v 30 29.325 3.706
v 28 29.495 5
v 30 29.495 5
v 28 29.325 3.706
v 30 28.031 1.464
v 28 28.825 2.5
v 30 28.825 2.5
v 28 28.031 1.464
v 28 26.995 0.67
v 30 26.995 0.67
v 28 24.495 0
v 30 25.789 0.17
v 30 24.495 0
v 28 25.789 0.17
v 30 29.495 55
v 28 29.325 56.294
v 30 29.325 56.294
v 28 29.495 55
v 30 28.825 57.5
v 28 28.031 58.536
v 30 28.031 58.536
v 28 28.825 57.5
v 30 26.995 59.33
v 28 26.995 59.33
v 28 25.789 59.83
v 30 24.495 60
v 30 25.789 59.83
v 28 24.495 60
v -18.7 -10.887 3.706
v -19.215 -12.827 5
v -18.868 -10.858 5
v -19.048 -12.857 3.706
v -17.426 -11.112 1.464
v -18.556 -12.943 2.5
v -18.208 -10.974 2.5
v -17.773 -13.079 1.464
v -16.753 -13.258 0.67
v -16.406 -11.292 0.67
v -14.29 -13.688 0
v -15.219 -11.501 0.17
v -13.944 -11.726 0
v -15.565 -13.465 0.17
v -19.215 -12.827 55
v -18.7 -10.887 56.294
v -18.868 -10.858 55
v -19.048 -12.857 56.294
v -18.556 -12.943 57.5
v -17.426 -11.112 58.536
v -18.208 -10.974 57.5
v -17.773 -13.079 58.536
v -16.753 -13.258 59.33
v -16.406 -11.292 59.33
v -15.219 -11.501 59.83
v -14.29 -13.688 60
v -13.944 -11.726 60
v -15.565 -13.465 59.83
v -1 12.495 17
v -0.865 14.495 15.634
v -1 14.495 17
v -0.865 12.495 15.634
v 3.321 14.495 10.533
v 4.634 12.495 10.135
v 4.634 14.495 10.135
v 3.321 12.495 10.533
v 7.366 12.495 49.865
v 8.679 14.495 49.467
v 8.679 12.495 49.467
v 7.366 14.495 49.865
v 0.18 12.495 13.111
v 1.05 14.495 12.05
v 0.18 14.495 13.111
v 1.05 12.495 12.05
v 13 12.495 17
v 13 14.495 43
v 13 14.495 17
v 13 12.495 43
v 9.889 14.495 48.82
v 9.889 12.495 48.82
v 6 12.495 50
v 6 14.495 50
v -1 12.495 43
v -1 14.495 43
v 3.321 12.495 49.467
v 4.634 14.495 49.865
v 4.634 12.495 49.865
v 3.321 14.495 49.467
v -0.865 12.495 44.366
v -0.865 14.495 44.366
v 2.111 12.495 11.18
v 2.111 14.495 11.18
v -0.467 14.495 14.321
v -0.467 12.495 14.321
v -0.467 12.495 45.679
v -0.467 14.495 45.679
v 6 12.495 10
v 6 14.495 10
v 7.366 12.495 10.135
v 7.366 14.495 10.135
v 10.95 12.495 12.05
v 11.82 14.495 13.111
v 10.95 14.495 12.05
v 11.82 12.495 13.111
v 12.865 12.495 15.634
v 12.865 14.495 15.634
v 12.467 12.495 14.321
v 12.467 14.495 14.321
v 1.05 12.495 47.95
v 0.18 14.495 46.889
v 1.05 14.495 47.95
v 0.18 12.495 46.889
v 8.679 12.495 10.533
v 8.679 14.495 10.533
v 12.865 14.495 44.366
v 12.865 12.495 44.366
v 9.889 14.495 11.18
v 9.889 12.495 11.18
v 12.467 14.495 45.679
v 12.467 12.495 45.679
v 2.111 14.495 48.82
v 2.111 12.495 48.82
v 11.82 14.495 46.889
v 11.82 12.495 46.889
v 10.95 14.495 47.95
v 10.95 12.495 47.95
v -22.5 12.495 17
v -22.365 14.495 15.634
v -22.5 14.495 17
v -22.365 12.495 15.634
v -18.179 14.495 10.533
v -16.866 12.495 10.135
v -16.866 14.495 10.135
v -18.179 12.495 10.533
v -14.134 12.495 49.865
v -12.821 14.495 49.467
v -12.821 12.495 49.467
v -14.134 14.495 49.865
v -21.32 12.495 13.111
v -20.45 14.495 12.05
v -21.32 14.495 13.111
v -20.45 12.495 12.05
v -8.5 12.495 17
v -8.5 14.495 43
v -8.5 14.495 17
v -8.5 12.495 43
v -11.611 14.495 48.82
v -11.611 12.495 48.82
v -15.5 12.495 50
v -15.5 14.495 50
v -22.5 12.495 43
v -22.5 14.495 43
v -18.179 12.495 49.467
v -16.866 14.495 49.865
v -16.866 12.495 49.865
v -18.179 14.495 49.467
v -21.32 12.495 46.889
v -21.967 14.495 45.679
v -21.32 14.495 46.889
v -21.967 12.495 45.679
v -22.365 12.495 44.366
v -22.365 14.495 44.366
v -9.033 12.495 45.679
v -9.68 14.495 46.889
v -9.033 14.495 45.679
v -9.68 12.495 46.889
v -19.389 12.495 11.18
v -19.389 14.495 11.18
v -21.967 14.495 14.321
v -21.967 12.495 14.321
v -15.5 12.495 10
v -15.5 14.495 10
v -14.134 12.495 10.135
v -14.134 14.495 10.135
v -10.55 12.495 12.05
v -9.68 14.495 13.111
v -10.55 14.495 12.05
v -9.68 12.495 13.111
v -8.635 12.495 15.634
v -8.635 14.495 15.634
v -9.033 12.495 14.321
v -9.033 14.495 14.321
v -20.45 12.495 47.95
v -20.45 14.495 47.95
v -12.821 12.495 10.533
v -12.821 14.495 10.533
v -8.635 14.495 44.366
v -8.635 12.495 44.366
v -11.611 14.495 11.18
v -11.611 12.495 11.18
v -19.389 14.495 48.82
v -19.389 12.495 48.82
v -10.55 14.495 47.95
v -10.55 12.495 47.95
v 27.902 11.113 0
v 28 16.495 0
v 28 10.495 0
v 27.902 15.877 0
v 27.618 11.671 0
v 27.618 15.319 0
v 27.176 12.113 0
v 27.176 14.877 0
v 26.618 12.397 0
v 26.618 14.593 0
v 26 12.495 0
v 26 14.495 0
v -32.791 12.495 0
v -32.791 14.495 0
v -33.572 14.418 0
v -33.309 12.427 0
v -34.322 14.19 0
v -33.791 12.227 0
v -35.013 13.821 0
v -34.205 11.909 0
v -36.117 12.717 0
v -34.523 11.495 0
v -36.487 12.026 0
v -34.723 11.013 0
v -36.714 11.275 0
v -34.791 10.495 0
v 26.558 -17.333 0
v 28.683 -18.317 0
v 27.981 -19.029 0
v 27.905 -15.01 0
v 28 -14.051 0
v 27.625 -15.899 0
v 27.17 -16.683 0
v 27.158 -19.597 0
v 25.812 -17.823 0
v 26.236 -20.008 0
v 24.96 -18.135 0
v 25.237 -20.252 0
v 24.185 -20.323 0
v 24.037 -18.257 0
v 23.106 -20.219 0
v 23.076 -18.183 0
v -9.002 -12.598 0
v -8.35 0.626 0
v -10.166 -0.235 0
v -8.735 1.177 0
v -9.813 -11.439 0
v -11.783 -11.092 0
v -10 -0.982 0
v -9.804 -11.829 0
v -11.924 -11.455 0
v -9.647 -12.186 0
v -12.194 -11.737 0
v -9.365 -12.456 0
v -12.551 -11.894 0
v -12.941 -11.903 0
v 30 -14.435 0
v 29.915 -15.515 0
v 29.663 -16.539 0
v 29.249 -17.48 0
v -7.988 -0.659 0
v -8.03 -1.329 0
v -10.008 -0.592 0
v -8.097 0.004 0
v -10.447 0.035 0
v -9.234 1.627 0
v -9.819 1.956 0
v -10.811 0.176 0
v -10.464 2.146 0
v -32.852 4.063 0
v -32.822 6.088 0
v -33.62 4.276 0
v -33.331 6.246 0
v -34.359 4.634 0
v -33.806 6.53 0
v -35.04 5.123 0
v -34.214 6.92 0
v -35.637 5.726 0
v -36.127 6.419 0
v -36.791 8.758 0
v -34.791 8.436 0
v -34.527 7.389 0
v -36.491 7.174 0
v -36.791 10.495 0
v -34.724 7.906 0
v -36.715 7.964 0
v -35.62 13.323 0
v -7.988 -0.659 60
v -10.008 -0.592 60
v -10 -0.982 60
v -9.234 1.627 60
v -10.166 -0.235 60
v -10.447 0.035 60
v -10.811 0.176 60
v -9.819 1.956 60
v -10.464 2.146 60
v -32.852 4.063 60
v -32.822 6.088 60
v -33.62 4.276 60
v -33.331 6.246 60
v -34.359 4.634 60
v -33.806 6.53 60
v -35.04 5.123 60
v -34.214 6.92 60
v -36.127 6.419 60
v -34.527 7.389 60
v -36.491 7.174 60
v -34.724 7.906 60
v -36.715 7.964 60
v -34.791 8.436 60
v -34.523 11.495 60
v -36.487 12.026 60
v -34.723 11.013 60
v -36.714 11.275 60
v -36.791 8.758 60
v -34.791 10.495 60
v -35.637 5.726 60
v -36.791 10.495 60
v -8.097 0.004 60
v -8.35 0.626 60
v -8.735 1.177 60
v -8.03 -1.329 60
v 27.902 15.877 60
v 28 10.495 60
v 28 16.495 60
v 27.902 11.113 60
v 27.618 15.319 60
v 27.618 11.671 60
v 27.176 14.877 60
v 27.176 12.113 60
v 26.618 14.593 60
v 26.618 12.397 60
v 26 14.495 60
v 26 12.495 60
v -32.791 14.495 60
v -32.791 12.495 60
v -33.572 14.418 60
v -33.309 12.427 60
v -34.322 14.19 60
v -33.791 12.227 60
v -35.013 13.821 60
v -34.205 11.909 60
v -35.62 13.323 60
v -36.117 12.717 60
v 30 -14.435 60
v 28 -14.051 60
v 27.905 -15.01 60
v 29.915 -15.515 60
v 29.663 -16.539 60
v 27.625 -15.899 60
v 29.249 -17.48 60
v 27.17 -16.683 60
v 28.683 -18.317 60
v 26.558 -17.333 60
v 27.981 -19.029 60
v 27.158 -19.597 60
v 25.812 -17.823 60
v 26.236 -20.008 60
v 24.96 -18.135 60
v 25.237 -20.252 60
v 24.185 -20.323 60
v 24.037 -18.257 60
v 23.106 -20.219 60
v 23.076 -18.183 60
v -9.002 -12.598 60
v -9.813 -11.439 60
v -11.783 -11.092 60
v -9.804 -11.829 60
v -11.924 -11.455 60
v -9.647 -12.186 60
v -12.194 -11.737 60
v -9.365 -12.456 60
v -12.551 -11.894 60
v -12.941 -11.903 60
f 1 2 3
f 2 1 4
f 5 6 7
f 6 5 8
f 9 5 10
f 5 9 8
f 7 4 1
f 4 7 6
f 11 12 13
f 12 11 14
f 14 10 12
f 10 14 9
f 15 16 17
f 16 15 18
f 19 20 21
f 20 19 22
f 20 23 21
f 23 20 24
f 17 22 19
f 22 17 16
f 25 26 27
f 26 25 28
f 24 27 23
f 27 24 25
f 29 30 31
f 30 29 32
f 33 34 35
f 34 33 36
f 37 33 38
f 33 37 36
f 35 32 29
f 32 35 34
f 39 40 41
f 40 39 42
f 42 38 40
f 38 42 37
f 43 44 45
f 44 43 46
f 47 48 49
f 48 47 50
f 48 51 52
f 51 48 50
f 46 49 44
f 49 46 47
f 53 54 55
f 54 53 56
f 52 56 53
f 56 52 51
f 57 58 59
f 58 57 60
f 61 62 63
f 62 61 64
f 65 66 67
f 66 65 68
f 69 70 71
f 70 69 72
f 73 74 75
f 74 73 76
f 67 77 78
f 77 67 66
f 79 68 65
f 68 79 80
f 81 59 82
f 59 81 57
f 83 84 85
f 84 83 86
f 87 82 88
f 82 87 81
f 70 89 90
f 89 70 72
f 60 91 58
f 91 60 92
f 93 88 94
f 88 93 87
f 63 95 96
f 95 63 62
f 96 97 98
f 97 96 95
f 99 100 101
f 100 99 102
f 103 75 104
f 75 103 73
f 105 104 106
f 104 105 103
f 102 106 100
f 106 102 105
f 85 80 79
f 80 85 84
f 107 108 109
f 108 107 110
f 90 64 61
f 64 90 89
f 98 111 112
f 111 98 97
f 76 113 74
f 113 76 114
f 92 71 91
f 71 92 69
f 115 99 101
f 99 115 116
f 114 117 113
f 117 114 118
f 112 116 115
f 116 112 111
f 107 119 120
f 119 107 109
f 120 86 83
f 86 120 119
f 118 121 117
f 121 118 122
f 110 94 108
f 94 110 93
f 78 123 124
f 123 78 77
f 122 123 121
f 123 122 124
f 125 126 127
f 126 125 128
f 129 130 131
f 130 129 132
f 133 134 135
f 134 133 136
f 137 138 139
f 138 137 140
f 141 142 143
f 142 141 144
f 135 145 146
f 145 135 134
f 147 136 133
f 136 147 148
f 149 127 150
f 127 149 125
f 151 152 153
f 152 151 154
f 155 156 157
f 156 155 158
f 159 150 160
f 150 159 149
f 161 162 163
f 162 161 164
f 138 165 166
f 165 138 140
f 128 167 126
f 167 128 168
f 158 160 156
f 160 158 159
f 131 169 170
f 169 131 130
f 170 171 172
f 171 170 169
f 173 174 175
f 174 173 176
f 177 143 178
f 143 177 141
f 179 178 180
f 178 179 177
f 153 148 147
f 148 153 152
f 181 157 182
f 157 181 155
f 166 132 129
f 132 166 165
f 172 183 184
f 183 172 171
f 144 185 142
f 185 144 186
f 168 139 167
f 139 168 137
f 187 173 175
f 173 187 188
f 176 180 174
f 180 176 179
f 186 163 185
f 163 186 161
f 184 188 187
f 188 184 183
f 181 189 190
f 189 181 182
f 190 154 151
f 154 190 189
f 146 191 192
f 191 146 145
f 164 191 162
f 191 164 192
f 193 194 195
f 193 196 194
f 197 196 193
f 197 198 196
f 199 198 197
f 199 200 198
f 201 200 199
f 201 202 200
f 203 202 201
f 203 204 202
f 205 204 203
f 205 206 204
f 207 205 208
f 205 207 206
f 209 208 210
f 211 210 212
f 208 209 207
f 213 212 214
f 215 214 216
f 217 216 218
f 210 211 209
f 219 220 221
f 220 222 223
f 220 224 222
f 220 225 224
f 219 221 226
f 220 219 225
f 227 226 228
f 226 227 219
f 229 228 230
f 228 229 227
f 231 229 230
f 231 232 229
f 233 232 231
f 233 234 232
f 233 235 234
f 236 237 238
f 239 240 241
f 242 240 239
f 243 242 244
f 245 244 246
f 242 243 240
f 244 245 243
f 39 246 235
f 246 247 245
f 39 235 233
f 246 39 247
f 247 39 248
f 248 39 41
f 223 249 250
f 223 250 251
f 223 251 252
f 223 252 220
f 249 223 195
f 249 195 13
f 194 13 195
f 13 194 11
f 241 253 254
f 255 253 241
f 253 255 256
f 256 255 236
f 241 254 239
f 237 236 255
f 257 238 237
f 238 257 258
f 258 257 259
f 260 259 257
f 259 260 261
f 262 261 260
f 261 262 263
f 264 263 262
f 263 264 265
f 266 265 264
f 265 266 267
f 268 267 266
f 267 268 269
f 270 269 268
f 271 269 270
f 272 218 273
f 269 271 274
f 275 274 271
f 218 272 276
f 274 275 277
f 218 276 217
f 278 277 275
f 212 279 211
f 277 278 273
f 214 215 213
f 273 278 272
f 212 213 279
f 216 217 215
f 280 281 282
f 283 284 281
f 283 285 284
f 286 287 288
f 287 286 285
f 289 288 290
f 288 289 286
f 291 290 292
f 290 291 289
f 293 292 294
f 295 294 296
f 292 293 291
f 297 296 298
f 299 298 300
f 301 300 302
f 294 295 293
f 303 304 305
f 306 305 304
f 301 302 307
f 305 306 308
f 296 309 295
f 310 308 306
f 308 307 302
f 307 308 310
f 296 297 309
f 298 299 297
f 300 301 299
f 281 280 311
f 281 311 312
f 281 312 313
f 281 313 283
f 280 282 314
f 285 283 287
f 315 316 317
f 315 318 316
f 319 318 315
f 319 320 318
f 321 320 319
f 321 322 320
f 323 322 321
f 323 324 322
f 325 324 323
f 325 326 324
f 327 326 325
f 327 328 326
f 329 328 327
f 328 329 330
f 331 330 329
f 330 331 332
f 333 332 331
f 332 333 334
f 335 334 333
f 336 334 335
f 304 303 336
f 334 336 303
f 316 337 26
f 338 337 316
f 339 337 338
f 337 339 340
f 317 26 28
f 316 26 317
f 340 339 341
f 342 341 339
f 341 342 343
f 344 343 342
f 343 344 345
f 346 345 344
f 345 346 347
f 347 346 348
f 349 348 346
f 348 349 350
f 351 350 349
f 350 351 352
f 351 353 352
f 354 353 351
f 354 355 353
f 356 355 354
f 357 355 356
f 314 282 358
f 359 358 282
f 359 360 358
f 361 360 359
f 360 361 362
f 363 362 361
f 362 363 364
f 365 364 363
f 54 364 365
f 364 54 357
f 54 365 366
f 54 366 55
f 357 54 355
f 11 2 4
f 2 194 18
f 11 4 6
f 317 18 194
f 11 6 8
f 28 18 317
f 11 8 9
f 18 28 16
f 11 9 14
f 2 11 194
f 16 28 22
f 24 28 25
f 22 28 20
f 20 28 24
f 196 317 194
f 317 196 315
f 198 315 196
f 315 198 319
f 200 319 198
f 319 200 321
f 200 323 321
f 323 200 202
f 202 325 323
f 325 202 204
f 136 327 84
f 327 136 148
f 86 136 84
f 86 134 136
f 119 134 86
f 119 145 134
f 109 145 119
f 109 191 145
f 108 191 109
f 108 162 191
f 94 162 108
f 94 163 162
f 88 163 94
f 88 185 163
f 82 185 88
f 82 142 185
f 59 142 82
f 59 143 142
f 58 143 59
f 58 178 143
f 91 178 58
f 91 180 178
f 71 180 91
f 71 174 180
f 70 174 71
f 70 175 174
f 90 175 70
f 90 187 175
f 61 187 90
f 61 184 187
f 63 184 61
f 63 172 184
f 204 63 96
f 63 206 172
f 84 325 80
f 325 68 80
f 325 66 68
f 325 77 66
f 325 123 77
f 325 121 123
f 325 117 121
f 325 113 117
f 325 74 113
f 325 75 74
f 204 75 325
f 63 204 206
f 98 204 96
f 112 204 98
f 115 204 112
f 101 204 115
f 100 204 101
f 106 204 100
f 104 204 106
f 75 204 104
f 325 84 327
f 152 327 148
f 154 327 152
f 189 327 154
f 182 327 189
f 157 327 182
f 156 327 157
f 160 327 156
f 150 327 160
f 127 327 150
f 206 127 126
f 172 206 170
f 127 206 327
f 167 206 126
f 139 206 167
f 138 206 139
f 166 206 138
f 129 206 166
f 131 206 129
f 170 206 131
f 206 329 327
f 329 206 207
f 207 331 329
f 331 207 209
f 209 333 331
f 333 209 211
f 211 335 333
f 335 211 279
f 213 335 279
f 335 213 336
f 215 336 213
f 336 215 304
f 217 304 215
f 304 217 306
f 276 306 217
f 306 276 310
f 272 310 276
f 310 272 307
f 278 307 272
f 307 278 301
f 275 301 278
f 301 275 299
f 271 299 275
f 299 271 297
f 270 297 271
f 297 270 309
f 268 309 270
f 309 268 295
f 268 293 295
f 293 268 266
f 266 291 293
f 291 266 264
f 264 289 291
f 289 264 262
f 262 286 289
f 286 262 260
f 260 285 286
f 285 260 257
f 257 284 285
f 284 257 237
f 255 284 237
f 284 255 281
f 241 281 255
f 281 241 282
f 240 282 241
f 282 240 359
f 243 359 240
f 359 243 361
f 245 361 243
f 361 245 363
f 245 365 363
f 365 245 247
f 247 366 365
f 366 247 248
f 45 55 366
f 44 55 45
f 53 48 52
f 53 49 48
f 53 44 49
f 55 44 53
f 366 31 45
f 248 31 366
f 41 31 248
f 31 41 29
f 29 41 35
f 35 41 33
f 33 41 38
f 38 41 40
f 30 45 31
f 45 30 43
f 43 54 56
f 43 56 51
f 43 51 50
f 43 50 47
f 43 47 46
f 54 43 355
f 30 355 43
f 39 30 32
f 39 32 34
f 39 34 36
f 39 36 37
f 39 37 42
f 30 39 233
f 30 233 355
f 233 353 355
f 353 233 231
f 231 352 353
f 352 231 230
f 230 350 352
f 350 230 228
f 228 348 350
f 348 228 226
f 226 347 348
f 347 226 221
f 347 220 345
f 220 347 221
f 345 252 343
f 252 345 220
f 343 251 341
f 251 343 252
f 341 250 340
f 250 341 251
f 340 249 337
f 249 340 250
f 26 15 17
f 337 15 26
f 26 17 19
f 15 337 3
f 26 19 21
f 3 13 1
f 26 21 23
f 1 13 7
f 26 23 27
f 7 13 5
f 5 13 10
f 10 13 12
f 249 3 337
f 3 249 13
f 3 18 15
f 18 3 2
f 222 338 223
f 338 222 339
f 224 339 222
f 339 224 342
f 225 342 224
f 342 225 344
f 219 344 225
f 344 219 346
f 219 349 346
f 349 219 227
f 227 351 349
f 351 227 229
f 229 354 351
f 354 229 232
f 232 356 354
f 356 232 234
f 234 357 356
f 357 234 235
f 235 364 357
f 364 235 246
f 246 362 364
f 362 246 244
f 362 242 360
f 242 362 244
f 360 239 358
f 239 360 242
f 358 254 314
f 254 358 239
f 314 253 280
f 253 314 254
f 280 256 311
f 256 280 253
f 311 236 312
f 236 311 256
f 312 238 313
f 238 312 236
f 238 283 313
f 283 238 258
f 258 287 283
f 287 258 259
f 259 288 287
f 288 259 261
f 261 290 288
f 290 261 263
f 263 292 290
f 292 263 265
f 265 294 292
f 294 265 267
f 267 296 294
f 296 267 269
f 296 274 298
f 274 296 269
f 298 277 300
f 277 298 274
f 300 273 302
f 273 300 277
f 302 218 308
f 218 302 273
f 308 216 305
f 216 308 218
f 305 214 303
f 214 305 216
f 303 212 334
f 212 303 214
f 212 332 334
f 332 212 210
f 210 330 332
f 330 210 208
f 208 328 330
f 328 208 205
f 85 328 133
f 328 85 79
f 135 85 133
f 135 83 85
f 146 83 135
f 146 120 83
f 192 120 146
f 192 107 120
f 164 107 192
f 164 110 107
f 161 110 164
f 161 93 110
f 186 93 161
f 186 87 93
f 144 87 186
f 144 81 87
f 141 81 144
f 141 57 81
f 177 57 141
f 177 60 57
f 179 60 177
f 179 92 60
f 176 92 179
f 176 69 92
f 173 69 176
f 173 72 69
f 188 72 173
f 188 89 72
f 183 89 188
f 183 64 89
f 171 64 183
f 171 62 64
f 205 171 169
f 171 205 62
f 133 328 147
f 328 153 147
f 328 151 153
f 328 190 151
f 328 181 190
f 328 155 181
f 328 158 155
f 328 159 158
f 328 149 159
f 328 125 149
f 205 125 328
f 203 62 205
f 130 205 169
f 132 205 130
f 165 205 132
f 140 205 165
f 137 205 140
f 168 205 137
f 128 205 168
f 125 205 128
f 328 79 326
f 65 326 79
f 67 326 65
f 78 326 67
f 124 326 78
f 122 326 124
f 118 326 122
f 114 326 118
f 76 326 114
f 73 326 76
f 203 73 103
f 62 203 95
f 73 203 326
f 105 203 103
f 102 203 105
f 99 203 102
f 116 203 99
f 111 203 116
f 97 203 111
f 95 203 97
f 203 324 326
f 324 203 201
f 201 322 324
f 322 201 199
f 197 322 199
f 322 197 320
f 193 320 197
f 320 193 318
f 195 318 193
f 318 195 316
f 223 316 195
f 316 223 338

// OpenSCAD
// Smartphone Stand by DrLex, 2017/10
// Released under Creative Commons - Attribution license

// Thickness of your phone. Depending on the shape, you may need to add some extra margin.
thick = 12.0; //[3.0:0.1:25.0]
// How high to raise the phone from the surface. This should be high enough if you want to be able to plug in a USB cable.
lift = 40; //[10.0:0.5:60.0]
// Width of the holder.
width = 60.0; //[5:0.5:100.0]
// Length of the lip at the rear.
rearLip = 15; //[5:0.5:60]
// Enable slots in the rear (to reduce material, route cables, or just for the looks). Only if width is at least 34.
rearSlots = true;
// Omit the rear lip entirely to allow mounting to a wall.
wallMount = false;
// Create a hole for a USB cable. Cannot be used if thick < 9.
usbHole = false;
// Create a cable hole in the bottom front.
frontHole = false;
// Create a cable hole in the bottom rear.
rearHole = false;

// Enable this and set width to 5 to print a quick test slice to see whether your phone fits well. (Rounded corners and holes will be omitted.)
testPiece = false;

// Rotate the model for easier previewing. Do not print in this orientation!
preview = false;


/* [Hidden] */
rear = rearLip + 14.495;
ox = thick * cos(10);
ox2 = ox + (lift - 36.5605) * sin(10);
lift2 = lift + thick * sin(10);

rearSlot1 = lift < 30 || lift >= 53 ? lift/2 + 14 : lift/2 + 4;
rearSlot2 = lift >= 30 ? rearSlot1 + 21.5 : 0.0;
rearSlot3 = lift >= 53 ? rearSlot1 - 21.5 : 0.0;

rotation = preview ? [90, 0, 90] : [0, 0, 90];
shift = preview ? [-width/2, 0, 0] : [lift/2 + 10, 0, 0];

translate(shift) rotate(rotation) difference() {
    linear_extrude(width, convexity=10) extrusionProfile();

    if(! testPiece) {
        translate([rear, 0, 0]) rotate([90, 0, 0]) cornerCutter();
        translate([rear, 0, width]) rotate([-90, 0, 0]) cornerCutter();
        translate([-1.00976 - ox, 7.13165 + lift2, 0]) rotate([90, 0, 80]) cornerCutter();
        translate([-1.00976 - ox, 7.13165 + lift2, width]) rotate([-90, 0, 80]) cornerCutter();

        if(rearSlots && width >= 34) {
            translate([13.495, rearSlot1, width/2]) rotate([0, 90, 0]) stretchCylinder(7, width - 20, 5);
            if(rearSlot2 > 0)
                translate([13.495, rearSlot2, width/2]) rotate([0, 90, 0]) stretchCylinder(7, width - 20, 5);
            if(rearSlot3 > 0)
                translate([13.495, rearSlot3, width/2]) rotate([0, 90, 0]) stretchCylinder(7, width - 20, 5);
        }

        if(usbHole && thick >= 8.8) {
            translate([(-0.982058 + 0.725908 - ox)/2, (lift - 0.30121 + lift2)/2, width/2]) rotate([100,90,0]) smoothHole(13, 9);
        }

        // Extra fanciness has been added to reduce the need for supports. You still need good cooling and print at thin layers to avoid making a mess, though. Or, simply cut away the mess after printing.
        if(frontHole) {
            translate([-ox2-9, -0.49, width/2]) rotate([90, 0, 0]) stretchCylinder(7.4, 30, 5);
            translate([-ox2-10, 0, width/2]) rotate([90, 0, 90]) stretchCylinder(7, 21, 17);
            translate([-ox2-3.3, 0, width/2]) cube([3.6, 10, 14.8], center=true);
        }

        if(rearHole) {
            difference() {
                translate([13.495, -0.49, width/2]) rotate([90, 0, 0]) stretchCylinder(7.4, 22, 5);
                translate([13.495, 0, width/2-7.4]) cube([2.0, 10, .8], center=true);
                translate([13.495, 0, width/2+7.4]) cube([2.0, 10, .8], center=true);
            }
            translate([13.495, 0, width/2]) rotate([90, 0, 90]) stretchCylinder(7, 21, 8);
            translate([11.495, 0, width/2]) cube([2, 10, 14.8], center=true);
            translate([15.495, 0, width/2]) cube([2, 10, 14.8], center=true);
        }

//        if(frontHole) {
//            translate([-ox - 10, 1, width/2]) rotate([90, 0, 0]) stretchSphere(7, 30, 5);
//        }
//        
//        if(rearHole) {
//             translate([13.495, 1, width/2]) rotate([90, 0, 0]) stretchSphere(7, 22, 5);
//        }

        if(wallMount) {
            translate([14.495, -5, -5]) cube([rearLip, 12, width+10]);
        }
    }
}


module cornerCutter() {
    difference() {
        cube([10, 10, 5], center=true);
        translate([-5, 5, 0]) cylinder(r=5, h=6, $fn=24, center=true);
    }
}

module smoothHole(w, d) {
    minkowski() {
        cube([w-2, d-2, 5], center=true);
        cylinder(r=1, h=1, $fn=20);
    }
}

module stretchCylinder(r, l, h) {
    hull() {
        translate([-l/2+r, 0, 0]) cylinder(r=r, h=h, center=true, $fn=32);
        translate([l/2-r, 0, 0]) cylinder(r=r, h=h, center=true, $fn=32);
    }
}

module stretchSphere(r, l, h) {
    hull() {
        translate([-l/2+r, 0, h/2]) sphere(r=r, center=true, $fn=32);
        translate([l/2-r, 0, h/2]) sphere(r=r, center=true, $fn=32);        
        translate([-l/2+r, 0, -h/2]) sphere(r=r, center=true, $fn=32);
        translate([l/2-r, 0, -h/2]) sphere(r=r, center=true, $fn=32);        
    }
}

// These coordinates were extracted from a prototype model created in Blender.
// In retrospect I might have used a single line instead, and add thickness to it with offset(). However, I'm not sure how easy it would be to add the various rounded corners.
module extrusionProfile() {
    polygon(points = [
        [rear, 0], // rear T-joint outer (0)
        [rear, 2],
        [16.495, 2],
        [15.877, 2.09789],
        [15.3195, 2.38197],
        [14.877, 2.82443],
        [14.5929, 3.38197],
        [14.495, 4],
        [12.495, 4], // rear T-joint inner (8)
        [12.3971, 3.38197],
        [12.1131, 2.82443],
        [11.6706, 2.38197],
        [11.1131, 2.09789],
        [10.495, 2],
        [14.495, 22.7912 + lift], // top arc outer (14)
        [14.4182, 23.5716 + lift],
        [14.1905, 24.322 + lift],
        [13.8209, 25.0135 + lift],
        [13.3234, 25.6196 + lift],
        [12.7173, 26.1171 + lift],
        [12.0258, 26.4867 + lift],
        [11.2754, 26.7144 + lift],
        [10.495, 26.7912 + lift],
        [8.758, 26.7912 + lift],
        [7.96429, 26.7155 + lift],
        [7.17439, 26.4914 + lift],
        [6.41864, 26.1273 + lift],
        [5.72611, 25.6374 + lift],
        [5.12338, 25.0405 + lift],
        [4.63365, 24.3595 + lift],
        [4.27570, 23.6205 + lift],
        [4.06332, 22.852 + lift],
        [6.08829, 22.8216 + lift], // top arc inner (32)
        [6.24633, 23.3314 + lift],
        [6.52989, 23.8064 + lift],
        [6.91965, 24.2143 + lift],
        [7.38906, 24.5273 + lift],
        [7.90612, 24.7241 + lift],
        [8.43559, 24.7912 + lift],
        [10.495, 24.7912 + lift],
        [11.0127, 24.7231 + lift],
        [11.495, 24.5233 + lift],
        [11.9092, 24.2054 + lift],
        [12.2271, 23.7912 + lift],
        [12.4269, 23.3089 + lift],
        [12.495, 22.7912 + lift],
        [0.176419, 0.811108 + lift], // cradle rear outer (46)
        [0.034995, 0.447456 + lift],
        [-0.234827, 0.165604 + lift],
        [-0.591969, 0.008461 + lift],
        [-0.982058, lift],
        [-1.32935, -1.96966 + lift], // cradle rear inner (51)
        [-0.658872, -2.01151 + lift],
        [0.0041122, -1.90311 + lift],
        [0.626352, -1.6499 + lift],
        [1.17665, -1.26458 + lift],
        [1.62741, -0.766468 + lift],
        [1.95602, -0.180542 + lift],
        [2.14601, 0.463818 + lift],
        [0.725908 - ox, -0.30121 + lift2], // cradle front (59)
        [0.362259 - ox, -0.159795 + lift2],
        [0.080406 - ox, 0.110022 + lift2],
        [-0.076738 - ox, 0.467158 + lift2],
        [-0.085251 - ox, 0.857245 + lift2],
        [0.959858 - ox, 6.78435 + lift2],
        [-1.00976 - ox, 7.13165 + lift2],
        [-0.779844 - ox, -3.08198 + lift2], // cradle T-joint inner (66)
        [-0.638426 - ox, -2.71833 + lift2],
        [-0.368612 - ox, -2.43648 + lift2],
        [-0.011475 - ox, -2.27934 + lift2],
        [0.378613 - ox, -2.27083 + lift2],
        [-7.80451 - ox2, 6.89365], // front outer (71)
        [-7.90847 - ox2, 5.81525],
        [-7.83752 - ox2, 4.7634],
        [-7.59339 - ox2, 3.764],
        [-7.1821 - ox2, 2.84167],
        [-6.61377 - ox2, 2.0191],
        [-5.90239 - ox2, 1.31657],
        [-5.06549 - ox2, 0.751364],
        [-4.12367 - ox2, 0.3374],
        [-3.10012 - ox2, 0.084871],
        [-2.02004 - ox2, 0],
        [-1.63654 - ox2, 2], // front inner (82)
        [-2.59531 - ox2, 2.09461],
        [-3.48387 - ox2, 2.37482],
        [-4.26807 - ox2, 2.82985],
        [-4.91777 - ox2, 3.44222],
        [-5.40802 - ox2, 4.18839],
        [-5.71996 - ox2, 5.03969],
        [-5.84161 - ox2, 5.96341],
        [-5.7683 - ox2, 6.92404] // (90)
    ], paths = [
        [0, 1, 2, 3, 4, 5, 6, 7, // rear T-joint outer
        14, 15, 16, 17, 18, 19, 20, 21, 22, 23, 24, 25, 26, 27, 28, 29, 30, 31, // top arc outer
        46, 47, 48, 49, 50, // cradle rear outer
        59, 60, 61, 62, 63, 64, 65, // cradle front
        71, 72, 73, 74, 75, 76, 77, 78, 79, 80, 81, // front outer
        0], // close outer loop
        [8, 9, 10, 11, 12, 13, // rear T-joint inner
        82, 83, 84, 85, 86, 87, 88, 89, 90, // front inner
        66, 67, 68, 69, 70, // cradle T-joint inner
        51, 52, 53, 54, 55, 56, 57, 58, // cradle rear inner
        32, 33, 34, 35, 36, 37, 38, 39, 40, 41, 42, 43, 44, 45, // top arc inner
        8]
        ]);
}
